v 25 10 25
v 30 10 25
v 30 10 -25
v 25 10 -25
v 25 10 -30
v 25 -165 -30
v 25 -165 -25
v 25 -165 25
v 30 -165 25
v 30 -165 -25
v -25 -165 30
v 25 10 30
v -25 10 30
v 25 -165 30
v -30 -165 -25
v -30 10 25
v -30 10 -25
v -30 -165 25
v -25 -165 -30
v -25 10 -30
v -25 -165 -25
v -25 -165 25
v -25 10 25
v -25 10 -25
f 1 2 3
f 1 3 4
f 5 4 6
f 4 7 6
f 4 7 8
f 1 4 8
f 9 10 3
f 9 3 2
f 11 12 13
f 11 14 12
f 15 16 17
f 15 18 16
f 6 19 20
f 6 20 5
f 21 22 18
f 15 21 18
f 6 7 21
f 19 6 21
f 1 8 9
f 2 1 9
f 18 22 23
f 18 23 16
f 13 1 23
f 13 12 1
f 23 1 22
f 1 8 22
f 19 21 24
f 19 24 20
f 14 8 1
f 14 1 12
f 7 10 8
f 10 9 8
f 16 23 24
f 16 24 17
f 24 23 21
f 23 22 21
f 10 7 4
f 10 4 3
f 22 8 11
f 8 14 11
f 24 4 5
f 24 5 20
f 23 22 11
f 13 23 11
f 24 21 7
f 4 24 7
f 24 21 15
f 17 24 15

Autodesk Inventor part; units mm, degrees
ref_plane "YZ Plane" through (0, 0, 0) normal (1, 0, 0) x (0, 1, 0)
ref_plane "XZ Plane" through (0, 0, 0) normal (0, 1, 0) x (-1, 0, 0)
ref_plane "XY Plane" through (0, 0, 0) normal (0, 0, 1) x (1, 0, 0)
sketch "Sketch1" plane through (0, 0, 0) normal (0, 1, 0) x (-1, 0, 0)
  line L0 (-20, -20) -> (20, -20)
  line L1 (20, -20) -> (20, 20)
  line L2 (20, 20) -> (-20, 20)
  line L3 (-20, 20) -> (-20, -20)
  line L4 (-20, -20) -> (20, 20) construction
  line L5 (20, -20) -> (-20, 20) construction
  line L6 (30, 30) -> (30, -30)
  line L7 (30, -30) -> (-30, -30)
  line L8 (-30, -30) -> (-30, 30)
  line L9 (-30, 30) -> (30, 30)
  line L10 (-25, 25) -> (25, 25)
  line L11 (25, 25) -> (25, -25)
  line L12 (25, -25) -> (-25, -25)
  line L13 (-25, -25) -> (-25, 25)
  line L14 (25, 25) -> (25, 30)
  line L15 (25, 25) -> (30, 25)
  line L16 (-25, 25) -> (-25, 30)
  line L17 (-25, 25) -> (-30, 25)
  line L18 (-25, -25) -> (-30, -25)
  line L19 (-25, -25) -> (-25, -30)
  line L20 (25, -25) -> (30, -25)
  line L21 (25, -25) -> (25, -30)
  line L22 (0, 25) -> (0, 30)
  line L23 (0, -25) -> (0, -30)
  point P0 (0, 0)
  dimension "d0" = 40
  dimension "d1" = 40
  dimension "d2" = 10
  dimension "d3" = 5
extrude "Extrusion1" add sketch "Sketch1" along normal blind 10 contours L6 L20 L11 L15 | L14 L10 L22 L9 | L22 L10 L16 L9 | L21 L7 L23 L12 | L23 L7 L19 L12 | L13 L18 L8 L17
extrude "Extrusion2" add sketch "Sketch1" against normal blind 165 contours L6 L20 L11 L15 | L14 L10 L22 L9 | L22 L10 L16 L9 | L21 L7 L23 L12 | L23 L7 L19 L12 | L13 L18 L8 L17
sketch "Sketch2" plane through (30, 10, 25) normal (1, 0, 0) x (0, 0, -1)
  point P0 (25, -10)
properties part number "Landing Holder"
